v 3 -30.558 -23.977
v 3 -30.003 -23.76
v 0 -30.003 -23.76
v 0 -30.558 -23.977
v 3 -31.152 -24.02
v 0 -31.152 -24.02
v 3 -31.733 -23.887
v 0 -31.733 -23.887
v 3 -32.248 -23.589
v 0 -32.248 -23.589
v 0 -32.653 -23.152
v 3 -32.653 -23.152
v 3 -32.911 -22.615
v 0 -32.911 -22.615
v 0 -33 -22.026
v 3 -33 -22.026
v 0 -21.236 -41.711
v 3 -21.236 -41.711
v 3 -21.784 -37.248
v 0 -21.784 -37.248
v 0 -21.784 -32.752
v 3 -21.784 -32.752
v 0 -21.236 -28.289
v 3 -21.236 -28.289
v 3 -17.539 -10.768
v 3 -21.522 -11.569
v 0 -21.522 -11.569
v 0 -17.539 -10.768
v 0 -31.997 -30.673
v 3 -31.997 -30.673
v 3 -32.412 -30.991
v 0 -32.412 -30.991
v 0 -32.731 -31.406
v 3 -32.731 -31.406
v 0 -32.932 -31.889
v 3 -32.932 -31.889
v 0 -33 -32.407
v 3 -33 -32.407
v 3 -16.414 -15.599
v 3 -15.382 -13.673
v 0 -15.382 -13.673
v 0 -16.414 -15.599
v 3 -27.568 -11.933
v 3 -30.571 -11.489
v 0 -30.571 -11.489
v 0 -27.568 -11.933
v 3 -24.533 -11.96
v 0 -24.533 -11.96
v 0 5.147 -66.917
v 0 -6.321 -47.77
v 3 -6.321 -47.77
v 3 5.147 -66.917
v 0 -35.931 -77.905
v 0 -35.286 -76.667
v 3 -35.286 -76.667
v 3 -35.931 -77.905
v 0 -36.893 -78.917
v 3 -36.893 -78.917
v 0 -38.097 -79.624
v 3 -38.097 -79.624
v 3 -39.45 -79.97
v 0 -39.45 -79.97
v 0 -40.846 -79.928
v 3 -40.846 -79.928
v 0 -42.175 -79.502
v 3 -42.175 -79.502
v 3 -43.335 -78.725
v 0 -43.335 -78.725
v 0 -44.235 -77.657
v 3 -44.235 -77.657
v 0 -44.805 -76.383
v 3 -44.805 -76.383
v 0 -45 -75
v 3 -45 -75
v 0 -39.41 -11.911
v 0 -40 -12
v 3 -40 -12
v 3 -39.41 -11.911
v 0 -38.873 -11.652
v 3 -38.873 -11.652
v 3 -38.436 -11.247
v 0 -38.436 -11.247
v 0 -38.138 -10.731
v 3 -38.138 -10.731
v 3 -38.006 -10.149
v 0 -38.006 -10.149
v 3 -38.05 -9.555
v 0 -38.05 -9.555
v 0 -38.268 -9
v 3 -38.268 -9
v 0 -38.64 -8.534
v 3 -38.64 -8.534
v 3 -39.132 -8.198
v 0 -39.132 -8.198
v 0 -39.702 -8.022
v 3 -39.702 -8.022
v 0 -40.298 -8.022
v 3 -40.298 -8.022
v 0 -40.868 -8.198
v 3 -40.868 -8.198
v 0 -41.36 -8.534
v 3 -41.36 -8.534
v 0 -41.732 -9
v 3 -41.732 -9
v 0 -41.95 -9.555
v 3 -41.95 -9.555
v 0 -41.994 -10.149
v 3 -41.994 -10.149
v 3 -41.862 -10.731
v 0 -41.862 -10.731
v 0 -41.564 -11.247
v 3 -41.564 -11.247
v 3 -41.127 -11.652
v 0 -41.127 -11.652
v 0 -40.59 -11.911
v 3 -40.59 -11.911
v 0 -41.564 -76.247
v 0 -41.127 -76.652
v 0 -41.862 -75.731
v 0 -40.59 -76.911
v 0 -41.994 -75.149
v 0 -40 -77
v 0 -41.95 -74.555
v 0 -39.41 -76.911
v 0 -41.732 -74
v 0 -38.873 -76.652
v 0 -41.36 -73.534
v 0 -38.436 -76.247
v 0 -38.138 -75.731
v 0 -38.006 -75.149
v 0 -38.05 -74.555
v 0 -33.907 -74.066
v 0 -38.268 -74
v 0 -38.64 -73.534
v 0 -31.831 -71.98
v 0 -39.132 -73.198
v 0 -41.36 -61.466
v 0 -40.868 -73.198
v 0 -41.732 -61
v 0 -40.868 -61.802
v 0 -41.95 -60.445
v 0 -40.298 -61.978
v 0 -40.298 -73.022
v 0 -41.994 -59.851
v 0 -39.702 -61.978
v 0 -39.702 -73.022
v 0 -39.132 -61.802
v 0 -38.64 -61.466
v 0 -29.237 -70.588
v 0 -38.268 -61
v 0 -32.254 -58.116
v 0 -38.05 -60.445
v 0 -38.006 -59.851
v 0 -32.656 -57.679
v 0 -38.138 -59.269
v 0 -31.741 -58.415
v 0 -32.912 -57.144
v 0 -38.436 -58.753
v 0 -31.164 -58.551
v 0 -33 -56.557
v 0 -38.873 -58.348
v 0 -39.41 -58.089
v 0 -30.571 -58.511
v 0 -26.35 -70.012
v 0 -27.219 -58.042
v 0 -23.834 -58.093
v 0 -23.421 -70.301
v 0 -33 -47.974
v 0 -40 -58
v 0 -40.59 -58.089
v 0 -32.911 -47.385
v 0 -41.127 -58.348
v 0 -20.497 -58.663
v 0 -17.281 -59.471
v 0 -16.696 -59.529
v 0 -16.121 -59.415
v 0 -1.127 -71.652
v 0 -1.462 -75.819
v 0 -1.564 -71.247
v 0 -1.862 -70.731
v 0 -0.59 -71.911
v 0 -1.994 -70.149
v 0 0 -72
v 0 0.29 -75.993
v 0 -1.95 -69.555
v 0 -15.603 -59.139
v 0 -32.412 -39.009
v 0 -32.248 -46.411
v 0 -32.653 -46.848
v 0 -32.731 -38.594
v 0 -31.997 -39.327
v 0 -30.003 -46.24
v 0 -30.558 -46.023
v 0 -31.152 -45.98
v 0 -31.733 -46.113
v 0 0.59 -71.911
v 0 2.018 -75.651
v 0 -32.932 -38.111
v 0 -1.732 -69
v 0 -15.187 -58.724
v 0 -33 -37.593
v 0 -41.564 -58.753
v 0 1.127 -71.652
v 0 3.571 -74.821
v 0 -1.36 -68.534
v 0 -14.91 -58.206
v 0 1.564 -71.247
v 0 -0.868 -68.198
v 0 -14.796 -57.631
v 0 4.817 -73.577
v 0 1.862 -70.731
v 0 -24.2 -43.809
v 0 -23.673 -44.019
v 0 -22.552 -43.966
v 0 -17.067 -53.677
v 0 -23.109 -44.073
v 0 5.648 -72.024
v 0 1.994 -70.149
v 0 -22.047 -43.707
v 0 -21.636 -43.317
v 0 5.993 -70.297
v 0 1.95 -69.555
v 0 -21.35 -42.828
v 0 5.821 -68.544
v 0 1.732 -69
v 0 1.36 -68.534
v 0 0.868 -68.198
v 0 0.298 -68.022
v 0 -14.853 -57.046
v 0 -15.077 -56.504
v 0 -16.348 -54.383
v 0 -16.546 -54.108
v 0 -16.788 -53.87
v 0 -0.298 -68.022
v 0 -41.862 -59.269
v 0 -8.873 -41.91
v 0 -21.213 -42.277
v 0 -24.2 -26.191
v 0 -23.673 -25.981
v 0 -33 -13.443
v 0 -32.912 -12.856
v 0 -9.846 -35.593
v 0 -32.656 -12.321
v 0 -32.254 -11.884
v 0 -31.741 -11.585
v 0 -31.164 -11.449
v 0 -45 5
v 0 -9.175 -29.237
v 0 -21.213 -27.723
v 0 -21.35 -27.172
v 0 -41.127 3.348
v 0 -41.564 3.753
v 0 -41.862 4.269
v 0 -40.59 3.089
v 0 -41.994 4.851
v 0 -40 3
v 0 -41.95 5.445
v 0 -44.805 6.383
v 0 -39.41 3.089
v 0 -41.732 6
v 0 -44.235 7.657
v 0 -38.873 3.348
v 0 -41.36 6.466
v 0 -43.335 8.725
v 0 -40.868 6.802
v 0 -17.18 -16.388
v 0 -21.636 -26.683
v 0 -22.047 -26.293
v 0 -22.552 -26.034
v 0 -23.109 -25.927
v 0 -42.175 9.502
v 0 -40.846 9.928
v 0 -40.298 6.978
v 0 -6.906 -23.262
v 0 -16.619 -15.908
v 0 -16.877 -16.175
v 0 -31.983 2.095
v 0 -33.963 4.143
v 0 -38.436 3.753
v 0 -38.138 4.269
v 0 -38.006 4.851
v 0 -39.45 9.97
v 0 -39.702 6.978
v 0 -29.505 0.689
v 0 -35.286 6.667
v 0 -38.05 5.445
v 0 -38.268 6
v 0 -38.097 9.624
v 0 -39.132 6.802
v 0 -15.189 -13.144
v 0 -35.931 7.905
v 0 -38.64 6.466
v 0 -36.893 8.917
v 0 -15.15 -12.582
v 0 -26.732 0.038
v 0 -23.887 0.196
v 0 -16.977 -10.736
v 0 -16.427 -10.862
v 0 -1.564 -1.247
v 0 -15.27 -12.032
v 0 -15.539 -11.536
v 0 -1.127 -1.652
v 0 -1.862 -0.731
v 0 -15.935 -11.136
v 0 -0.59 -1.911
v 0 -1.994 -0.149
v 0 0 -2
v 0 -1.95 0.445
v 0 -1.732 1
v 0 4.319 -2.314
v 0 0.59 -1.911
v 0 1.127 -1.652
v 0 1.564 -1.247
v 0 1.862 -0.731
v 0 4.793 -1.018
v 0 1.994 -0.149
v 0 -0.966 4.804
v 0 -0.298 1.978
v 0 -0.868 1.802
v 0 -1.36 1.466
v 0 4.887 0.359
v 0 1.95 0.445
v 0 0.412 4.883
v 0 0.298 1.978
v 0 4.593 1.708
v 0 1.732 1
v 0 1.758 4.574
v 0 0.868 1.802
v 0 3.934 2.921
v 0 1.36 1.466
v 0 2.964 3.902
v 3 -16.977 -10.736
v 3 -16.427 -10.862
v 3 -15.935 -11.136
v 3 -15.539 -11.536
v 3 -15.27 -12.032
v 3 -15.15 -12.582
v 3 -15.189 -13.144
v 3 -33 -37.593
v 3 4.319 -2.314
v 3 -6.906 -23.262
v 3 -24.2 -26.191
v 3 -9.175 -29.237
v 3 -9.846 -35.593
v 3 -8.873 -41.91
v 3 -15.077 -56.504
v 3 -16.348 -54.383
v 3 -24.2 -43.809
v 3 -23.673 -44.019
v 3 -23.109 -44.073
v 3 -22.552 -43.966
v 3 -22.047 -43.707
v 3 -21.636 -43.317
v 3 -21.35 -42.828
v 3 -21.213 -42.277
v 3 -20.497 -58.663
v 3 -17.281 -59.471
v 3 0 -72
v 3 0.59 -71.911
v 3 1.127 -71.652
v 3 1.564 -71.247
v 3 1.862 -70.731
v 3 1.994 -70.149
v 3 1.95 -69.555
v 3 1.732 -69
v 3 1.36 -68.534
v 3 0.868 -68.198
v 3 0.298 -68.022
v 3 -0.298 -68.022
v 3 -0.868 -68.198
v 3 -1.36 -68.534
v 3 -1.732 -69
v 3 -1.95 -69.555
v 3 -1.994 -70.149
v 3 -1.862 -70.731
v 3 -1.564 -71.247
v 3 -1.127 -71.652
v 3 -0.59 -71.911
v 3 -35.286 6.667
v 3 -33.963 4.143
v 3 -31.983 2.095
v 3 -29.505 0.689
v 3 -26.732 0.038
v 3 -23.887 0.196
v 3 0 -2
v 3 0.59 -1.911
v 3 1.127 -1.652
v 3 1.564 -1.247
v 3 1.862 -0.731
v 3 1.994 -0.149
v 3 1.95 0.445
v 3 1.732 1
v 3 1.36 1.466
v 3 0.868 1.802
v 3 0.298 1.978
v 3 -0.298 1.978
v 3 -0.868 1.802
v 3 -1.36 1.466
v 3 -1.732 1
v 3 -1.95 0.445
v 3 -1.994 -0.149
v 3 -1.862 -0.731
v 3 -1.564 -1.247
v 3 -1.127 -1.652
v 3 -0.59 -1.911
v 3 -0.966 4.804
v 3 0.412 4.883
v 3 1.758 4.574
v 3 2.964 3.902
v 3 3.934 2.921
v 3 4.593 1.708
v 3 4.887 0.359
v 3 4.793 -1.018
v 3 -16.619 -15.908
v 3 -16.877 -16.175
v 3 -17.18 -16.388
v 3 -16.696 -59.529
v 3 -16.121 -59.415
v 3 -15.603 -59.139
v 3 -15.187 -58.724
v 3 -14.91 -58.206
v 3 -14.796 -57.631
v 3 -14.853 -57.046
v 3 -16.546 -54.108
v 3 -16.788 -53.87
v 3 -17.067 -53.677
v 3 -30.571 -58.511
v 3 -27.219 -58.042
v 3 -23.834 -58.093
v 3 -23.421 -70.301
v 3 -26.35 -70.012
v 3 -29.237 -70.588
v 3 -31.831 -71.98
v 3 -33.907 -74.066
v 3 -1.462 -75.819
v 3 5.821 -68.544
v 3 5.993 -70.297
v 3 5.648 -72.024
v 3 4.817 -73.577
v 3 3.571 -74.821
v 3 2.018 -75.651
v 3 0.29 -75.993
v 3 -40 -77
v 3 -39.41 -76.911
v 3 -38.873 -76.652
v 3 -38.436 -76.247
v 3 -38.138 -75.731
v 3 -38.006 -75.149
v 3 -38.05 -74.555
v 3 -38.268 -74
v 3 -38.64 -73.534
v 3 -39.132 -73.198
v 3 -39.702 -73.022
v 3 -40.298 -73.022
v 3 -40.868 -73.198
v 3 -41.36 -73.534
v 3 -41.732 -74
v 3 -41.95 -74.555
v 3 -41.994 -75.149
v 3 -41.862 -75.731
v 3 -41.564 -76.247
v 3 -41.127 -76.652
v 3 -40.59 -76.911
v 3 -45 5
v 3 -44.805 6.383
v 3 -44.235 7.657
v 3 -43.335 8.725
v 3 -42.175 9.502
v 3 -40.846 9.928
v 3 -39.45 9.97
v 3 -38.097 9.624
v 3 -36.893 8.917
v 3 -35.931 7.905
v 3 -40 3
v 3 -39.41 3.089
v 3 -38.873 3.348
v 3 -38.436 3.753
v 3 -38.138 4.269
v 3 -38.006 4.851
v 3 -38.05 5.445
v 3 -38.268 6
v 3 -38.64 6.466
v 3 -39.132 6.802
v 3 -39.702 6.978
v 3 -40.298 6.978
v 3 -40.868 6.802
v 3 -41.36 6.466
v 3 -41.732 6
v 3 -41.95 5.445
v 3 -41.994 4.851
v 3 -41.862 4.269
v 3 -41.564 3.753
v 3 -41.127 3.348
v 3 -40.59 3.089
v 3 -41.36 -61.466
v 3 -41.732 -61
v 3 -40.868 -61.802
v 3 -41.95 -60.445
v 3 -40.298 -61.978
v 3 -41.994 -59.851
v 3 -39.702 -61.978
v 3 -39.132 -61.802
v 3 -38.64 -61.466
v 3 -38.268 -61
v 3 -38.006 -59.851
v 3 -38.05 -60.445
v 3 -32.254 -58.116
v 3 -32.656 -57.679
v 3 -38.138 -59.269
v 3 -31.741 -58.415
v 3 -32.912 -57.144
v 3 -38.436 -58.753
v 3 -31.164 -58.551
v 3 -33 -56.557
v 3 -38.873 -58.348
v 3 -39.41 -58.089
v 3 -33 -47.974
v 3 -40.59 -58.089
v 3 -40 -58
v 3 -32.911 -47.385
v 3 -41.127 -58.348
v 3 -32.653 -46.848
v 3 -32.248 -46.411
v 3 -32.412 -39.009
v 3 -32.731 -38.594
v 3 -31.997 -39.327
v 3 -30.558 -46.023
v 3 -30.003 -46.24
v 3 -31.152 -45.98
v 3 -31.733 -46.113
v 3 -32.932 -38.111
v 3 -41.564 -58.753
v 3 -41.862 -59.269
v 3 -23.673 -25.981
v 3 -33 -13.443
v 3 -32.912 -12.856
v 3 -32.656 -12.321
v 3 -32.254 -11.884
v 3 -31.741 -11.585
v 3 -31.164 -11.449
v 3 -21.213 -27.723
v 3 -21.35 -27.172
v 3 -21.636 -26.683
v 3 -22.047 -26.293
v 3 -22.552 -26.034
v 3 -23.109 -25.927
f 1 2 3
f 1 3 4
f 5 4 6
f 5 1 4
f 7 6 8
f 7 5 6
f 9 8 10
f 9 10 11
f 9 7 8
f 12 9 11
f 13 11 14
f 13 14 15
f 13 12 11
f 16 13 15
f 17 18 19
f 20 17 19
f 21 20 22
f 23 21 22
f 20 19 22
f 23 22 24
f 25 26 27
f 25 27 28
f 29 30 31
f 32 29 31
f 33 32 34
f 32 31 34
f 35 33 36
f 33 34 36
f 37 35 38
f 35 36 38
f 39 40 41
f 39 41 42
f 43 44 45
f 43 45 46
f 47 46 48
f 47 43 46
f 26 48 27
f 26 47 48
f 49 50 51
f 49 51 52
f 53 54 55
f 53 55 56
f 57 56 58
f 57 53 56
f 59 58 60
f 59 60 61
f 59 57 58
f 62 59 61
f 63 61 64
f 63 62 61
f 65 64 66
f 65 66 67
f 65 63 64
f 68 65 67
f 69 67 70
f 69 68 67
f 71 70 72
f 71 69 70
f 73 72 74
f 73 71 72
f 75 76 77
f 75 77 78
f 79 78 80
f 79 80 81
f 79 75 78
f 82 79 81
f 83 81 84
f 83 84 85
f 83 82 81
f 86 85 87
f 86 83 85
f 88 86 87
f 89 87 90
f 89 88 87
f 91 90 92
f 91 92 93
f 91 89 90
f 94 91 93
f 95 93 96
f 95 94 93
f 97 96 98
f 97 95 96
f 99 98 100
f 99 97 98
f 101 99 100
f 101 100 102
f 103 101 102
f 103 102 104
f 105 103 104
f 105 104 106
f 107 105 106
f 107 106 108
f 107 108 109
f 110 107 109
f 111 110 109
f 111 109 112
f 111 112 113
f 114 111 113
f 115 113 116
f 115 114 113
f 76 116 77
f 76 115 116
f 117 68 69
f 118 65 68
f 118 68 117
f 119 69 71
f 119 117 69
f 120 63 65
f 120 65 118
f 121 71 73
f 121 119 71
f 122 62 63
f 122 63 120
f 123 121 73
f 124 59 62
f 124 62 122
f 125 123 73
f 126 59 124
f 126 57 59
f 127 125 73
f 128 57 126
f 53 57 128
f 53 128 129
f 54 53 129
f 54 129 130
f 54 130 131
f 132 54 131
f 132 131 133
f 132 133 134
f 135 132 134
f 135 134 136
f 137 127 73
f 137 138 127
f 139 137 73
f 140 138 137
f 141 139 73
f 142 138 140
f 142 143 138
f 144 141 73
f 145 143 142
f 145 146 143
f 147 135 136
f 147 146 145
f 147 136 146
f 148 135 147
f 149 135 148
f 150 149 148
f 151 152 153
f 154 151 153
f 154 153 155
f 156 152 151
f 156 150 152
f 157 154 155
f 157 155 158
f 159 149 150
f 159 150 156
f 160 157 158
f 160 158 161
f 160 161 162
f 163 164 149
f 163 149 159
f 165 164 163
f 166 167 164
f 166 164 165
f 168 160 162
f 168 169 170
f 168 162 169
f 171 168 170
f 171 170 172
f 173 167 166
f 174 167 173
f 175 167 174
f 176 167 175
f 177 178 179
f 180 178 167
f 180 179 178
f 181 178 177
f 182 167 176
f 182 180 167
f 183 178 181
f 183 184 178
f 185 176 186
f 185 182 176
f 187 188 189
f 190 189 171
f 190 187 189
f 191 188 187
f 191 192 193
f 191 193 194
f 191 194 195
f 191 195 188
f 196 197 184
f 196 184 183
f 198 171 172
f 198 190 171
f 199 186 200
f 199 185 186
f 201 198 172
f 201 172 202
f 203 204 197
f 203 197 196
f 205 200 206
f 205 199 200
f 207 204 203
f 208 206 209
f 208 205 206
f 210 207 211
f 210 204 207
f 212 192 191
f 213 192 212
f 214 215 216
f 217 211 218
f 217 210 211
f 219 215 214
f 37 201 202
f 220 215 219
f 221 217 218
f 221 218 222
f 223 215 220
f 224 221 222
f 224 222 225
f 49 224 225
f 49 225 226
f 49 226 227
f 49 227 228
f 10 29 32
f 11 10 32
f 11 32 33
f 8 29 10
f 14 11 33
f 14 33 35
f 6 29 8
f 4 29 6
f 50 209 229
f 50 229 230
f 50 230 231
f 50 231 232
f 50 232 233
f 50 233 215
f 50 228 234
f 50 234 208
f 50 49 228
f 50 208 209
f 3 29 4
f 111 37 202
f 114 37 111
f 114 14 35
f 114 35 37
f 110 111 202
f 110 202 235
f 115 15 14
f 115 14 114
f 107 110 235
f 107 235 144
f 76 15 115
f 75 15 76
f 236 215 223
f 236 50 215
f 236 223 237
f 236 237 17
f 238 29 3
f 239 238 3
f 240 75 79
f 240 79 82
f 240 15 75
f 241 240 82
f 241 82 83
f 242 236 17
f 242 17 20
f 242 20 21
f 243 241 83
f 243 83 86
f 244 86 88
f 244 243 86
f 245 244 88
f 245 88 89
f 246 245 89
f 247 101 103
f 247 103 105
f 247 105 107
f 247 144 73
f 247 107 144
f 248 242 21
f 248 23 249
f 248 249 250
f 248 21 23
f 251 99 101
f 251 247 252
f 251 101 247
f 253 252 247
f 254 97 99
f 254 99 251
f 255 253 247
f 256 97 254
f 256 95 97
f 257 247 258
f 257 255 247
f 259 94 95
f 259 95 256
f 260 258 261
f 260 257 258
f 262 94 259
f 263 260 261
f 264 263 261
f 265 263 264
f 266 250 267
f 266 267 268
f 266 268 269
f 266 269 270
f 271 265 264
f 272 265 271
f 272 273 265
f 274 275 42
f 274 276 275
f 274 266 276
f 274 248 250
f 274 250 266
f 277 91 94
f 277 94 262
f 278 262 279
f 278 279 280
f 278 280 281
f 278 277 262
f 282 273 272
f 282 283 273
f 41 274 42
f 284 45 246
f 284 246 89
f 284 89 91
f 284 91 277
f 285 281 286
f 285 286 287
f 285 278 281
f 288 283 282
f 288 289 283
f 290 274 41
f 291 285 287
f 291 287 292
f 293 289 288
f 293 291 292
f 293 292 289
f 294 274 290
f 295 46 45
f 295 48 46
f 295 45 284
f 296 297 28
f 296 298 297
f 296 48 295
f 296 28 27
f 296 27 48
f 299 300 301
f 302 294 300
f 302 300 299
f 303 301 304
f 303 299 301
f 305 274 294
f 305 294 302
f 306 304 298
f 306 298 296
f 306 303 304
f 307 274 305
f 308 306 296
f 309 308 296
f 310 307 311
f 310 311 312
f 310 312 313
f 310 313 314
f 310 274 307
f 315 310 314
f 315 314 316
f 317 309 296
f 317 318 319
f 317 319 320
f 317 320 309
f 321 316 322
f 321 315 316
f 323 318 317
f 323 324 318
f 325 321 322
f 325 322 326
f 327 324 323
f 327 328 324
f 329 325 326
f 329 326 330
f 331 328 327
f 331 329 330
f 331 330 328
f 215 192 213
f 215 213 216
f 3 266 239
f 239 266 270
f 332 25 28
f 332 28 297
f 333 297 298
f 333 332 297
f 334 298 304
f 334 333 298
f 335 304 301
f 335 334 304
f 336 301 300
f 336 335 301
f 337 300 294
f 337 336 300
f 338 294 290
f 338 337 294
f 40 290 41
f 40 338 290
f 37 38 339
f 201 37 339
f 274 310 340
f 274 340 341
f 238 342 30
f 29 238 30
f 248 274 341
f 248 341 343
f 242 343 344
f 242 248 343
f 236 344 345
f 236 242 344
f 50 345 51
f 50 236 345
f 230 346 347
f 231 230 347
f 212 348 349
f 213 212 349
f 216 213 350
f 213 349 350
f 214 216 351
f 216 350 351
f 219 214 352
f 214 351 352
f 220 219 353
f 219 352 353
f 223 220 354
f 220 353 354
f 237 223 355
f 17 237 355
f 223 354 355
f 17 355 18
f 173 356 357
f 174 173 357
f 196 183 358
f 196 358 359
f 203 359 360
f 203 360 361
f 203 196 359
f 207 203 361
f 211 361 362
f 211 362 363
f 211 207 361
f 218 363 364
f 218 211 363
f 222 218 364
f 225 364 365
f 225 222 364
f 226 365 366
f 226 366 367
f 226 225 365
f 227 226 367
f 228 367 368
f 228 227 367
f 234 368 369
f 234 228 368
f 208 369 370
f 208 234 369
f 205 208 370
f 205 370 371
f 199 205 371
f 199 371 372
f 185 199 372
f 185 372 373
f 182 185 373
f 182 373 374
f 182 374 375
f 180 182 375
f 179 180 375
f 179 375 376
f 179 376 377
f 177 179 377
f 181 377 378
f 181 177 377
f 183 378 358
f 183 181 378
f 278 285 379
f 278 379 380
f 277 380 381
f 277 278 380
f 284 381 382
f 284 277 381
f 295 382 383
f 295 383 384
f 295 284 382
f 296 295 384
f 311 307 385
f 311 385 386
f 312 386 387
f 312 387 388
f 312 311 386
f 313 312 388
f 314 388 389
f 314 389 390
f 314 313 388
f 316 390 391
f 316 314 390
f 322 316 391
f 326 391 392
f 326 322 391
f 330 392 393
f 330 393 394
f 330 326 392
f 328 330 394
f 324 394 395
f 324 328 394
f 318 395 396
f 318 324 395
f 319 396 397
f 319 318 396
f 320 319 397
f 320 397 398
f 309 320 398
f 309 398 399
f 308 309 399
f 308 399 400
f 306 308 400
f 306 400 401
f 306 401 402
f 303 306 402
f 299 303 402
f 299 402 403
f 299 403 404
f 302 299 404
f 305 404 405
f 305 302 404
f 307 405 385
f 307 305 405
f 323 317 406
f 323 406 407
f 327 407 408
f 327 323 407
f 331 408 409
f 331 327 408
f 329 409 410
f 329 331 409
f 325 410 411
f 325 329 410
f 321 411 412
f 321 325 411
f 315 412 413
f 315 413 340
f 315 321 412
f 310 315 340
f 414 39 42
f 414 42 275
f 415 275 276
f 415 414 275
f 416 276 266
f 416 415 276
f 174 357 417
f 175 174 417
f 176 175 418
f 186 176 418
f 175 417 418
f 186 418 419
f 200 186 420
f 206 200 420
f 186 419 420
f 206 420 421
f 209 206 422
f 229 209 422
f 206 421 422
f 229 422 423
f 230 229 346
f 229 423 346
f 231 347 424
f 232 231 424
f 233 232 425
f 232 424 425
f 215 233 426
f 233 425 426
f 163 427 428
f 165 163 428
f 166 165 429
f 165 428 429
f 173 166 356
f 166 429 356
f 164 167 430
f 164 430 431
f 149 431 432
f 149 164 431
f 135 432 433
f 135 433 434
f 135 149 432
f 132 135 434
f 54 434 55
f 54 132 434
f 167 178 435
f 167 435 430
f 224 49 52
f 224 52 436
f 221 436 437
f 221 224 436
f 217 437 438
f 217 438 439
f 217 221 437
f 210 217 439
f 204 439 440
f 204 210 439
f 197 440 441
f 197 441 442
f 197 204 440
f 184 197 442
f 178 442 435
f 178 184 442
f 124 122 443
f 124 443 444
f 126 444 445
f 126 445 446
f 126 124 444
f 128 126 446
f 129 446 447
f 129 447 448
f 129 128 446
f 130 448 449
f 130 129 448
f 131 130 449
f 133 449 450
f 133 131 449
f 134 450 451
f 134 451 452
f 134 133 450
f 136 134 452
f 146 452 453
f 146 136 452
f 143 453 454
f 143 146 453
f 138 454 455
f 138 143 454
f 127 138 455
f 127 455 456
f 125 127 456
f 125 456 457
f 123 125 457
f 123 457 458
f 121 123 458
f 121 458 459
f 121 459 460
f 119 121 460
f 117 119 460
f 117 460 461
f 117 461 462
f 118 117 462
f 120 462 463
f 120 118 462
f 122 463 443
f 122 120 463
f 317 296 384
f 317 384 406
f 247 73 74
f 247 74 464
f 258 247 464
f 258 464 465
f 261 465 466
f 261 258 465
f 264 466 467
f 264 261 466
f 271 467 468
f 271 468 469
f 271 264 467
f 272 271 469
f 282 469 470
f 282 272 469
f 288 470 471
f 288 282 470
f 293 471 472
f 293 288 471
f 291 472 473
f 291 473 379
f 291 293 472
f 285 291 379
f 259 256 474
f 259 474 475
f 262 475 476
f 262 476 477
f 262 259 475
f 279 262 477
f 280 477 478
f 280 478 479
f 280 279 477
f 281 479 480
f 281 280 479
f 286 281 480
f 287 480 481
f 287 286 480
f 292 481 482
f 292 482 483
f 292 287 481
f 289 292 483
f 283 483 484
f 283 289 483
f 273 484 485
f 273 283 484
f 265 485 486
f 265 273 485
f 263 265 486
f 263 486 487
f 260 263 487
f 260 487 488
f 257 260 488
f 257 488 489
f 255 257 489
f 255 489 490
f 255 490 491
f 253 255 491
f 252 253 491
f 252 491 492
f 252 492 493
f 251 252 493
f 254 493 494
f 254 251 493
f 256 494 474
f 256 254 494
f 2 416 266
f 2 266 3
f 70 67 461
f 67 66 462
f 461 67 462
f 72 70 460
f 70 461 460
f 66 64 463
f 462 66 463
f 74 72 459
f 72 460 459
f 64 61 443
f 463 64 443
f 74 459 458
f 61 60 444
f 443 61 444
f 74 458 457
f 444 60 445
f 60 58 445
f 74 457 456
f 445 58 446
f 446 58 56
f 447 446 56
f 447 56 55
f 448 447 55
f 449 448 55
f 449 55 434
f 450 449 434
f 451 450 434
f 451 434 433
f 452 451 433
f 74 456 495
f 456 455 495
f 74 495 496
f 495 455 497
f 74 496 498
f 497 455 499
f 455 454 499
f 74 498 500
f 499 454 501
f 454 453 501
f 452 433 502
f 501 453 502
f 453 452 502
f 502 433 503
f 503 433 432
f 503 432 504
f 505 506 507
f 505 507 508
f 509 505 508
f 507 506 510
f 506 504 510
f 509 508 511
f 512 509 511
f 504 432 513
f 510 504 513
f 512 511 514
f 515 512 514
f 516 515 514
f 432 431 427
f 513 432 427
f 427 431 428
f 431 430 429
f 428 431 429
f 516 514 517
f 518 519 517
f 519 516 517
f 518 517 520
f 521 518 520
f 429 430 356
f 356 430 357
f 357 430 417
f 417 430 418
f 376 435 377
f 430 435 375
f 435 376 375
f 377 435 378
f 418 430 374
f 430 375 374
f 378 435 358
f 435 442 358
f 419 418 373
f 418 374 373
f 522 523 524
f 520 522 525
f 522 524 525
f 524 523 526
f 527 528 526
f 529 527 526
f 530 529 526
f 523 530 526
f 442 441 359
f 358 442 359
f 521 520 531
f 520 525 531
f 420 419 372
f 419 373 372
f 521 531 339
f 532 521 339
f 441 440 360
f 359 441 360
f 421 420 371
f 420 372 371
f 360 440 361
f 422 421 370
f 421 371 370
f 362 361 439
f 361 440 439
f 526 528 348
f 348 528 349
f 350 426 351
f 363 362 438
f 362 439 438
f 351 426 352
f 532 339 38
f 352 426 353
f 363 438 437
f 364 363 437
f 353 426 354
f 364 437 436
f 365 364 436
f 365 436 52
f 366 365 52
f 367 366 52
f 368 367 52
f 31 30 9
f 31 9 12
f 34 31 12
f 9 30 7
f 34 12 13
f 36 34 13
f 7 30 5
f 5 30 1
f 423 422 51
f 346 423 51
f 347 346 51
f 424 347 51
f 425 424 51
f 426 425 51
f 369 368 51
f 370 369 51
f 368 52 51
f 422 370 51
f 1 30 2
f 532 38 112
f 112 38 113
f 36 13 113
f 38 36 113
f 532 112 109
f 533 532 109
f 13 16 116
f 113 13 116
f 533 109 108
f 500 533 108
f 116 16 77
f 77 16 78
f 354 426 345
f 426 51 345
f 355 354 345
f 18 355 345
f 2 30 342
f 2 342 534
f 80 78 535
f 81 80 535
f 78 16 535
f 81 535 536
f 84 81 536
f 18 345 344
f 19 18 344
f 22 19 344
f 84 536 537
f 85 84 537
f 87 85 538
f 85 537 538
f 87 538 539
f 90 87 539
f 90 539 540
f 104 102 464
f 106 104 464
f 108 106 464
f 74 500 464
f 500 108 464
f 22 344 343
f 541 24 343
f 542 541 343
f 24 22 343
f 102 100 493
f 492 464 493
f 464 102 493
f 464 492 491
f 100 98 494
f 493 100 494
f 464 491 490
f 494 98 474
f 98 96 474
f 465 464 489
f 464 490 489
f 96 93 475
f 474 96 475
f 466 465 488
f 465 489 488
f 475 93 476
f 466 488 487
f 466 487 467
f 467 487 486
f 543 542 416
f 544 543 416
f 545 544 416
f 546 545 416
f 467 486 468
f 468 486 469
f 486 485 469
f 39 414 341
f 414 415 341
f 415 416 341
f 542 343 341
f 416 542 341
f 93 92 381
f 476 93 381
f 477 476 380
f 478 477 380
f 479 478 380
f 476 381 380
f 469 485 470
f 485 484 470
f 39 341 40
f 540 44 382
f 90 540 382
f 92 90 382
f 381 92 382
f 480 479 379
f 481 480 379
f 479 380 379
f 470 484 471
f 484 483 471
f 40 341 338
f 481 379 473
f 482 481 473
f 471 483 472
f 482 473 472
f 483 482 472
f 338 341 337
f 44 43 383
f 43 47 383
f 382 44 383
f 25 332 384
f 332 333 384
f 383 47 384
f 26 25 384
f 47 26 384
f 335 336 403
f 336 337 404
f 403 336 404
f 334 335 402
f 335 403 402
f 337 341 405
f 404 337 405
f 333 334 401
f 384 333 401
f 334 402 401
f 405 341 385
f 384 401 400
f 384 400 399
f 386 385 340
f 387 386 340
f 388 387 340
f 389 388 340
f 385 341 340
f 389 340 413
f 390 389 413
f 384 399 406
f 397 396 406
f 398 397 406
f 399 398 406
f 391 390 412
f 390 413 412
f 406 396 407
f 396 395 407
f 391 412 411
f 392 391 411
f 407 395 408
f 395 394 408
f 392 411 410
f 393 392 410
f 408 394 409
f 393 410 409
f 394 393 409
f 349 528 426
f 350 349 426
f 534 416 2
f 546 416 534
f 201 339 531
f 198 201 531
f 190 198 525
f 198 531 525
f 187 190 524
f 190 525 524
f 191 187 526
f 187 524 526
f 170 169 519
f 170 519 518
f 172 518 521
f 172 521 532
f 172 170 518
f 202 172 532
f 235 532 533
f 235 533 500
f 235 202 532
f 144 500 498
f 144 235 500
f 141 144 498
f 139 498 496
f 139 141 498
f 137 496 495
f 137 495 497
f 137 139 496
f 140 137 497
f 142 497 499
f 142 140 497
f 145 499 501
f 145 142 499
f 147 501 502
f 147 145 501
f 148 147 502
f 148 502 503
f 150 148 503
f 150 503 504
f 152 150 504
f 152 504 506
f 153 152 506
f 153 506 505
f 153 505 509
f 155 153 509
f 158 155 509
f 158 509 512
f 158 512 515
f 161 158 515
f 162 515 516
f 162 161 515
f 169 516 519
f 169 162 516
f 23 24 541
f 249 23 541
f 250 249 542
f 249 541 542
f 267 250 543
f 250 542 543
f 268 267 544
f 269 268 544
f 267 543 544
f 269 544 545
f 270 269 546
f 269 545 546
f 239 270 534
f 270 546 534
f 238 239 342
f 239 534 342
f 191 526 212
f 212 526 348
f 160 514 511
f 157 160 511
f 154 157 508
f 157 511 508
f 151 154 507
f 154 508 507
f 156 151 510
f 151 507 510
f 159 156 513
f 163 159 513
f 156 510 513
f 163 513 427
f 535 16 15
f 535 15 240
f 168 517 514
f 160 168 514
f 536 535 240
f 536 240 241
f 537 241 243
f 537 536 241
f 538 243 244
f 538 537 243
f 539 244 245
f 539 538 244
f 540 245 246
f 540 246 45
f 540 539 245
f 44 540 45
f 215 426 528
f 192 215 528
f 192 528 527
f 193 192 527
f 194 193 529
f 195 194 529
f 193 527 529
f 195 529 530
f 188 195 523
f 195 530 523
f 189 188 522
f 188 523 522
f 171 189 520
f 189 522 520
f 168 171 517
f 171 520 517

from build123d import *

# Parameters (mm, degrees)
SKETCH_1_R          = 2
EXTRUDE_1_DEPTH     = 3
CUT_EXTRUDE_1_DEPTH = 3


with BuildPart() as part:
    # ｽｹｯﾁ1 → ﾎﾞｽ - 押し出し1 (new body)
    with BuildSketch(Plane(origin=(0, 0, 0), x_dir=(0, 0, -1), z_dir=(1, 0, 0))):
        with BuildLine():
            Line((75.819108386, -1.462182475), (70.301486023, -23.420893584))
            ThreePointArc((70.301486023, -23.420893584), (71.18795254, -30.585212423), (76.666666667, -35.285954792))
            ThreePointArc((76.666666667, -35.285954792), (79.927992798, -40.845509894), (75, -45))
            Line((75, -45), (-5, -45))
            ThreePointArc((-5, -45), (-9.927992798, -40.845509894), (-6.666666667, -35.285954792))
            ThreePointArc((-6.666666667, -35.285954792), (-1.303429587, -30.794428268), (-0.196130789, -23.88704006))
            Line((-0.196130789, -23.88704006), (-4.803895914, -0.965703915))
            ThreePointArc((-4.803895914, -0.965703915), (-2.920865081, 3.934278482), (2.314364214, 4.318995055))
            Line((2.314364214, 4.318995055), (23.261645602, -6.905754637))
            ThreePointArc((23.261645602, -6.905754637), (35.593052242, -9.845509438), (47.770153464, -6.320746485))
            Line((47.770153464, -6.320746485), (66.916984028, 5.14733062))
            ThreePointArc((66.916984028, 5.14733062), (73.576725635, 4.817367926), (75.819108386, -1.462182475))
        make_face()
        Circle(SKETCH_1_R, mode=Mode.SUBTRACT)
        with Locations((70, 0)):
            Circle(SKETCH_1_R, mode=Mode.SUBTRACT)
        with Locations((-5, -40)):
            Circle(SKETCH_1_R, mode=Mode.SUBTRACT)
        with Locations((75, -40)):
            Circle(SKETCH_1_R, mode=Mode.SUBTRACT)
        with Locations((10, -40)):
            Circle(SKETCH_1_R, mode=Mode.SUBTRACT)
        with Locations(Location((60, -40, 0), (0, 0, 180))):
            Circle(SKETCH_1_R, mode=Mode.SUBTRACT)
    extrude(amount=EXTRUDE_1_DEPTH)

    # ｽｹｯﾁ4 → ｶｯﾄ - 押し出し1 (cut)
    with BuildSketch(Plane(origin=(3, 0, 0), x_dir=(0, 0, -1), z_dir=(1, 0, 0))):
        with BuildLine():
            Line((16.388456854, -17.18013778), (23.759978506, -30.003236627))
            ThreePointArc((23.759978506, -30.003236627), (23.75717928, -32.001617006), (22.026063059, -33))
            Line((22.026063059, -33), (13.442662844, -33))
            ThreePointArc((13.442662844, -33), (11.884294691, -32.253590323), (11.489107607, -30.571488698))
            ThreePointArc((11.489107607, -30.571488698), (11.999153131, -26.050896834), (11.568512265, -21.52205088))
            Line((11.568512265, -21.52205088), (10.767826216, -17.539036649))
            ThreePointArc((10.767826216, -17.539036649), (11.53641023, -15.539043834), (13.673238513, -15.382016661))
            Line((13.673238513, -15.382016661), (15.599179861, -16.414046028))
            ThreePointArc((15.599179861, -16.414046028), (16.047519114, -16.74176593), (16.388456854, -17.18013778))
        make_face()
        with BuildLine():
            Line((26.191058921, -24.199740762), (30.673276651, -31.996763373))
            ThreePointArc((30.673276651, -31.996763373), (31.405575092, -32.731116222), (32.407192098, -33))
            Line((32.407192098, -33), (37.592807902, -33))
            ThreePointArc((37.592807902, -33), (38.594424908, -32.731116222), (39.326723349, -31.996763373))
            Line((39.326723349, -31.996763373), (43.808941079, -24.199740762))
            ThreePointArc((43.808941079, -24.199740762), (43.707310227, -22.047275438), (41.710827194, -21.236417067))
            ThreePointArc((41.710827194, -21.236417067), (35, -21.852586388), (28.289172806, -21.236417067))
            ThreePointArc((28.289172806, -21.236417067), (26.292689773, -22.047275438), (26.191058921, -24.199740762))
        make_face()
        with BuildLine():
            Line((58.663269251, -20.496528634), (59.471345903, -17.280592385))
            ThreePointArc((59.471345903, -17.280592385), (58.723884986, -15.187408917), (56.503971117, -15.077421353))
            Line((56.503971117, -15.077421353), (54.382909172, -16.347840593))
            ThreePointArc((54.382909172, -16.347840593), (53.983753774, -16.662131254), (53.676665716, -17.066854093))
            Line((53.676665716, -17.066854093), (46.240021494, -30.003236627))
            ThreePointArc((46.240021494, -30.003236627), (46.24282072, -32.001617006), (47.973936941, -33))
            Line((47.973936941, -33), (56.557337156, -33))
            ThreePointArc((56.557337156, -33), (58.115705309, -32.253590323), (58.510892393, -30.571488698))
            ThreePointArc((58.510892393, -30.571488698), (58.002515762, -25.52516752), (58.663269251, -20.496528634))
        make_face()
    extrude(amount=-CUT_EXTRUDE_1_DEPTH, mode=Mode.SUBTRACT)


solid = part.part
